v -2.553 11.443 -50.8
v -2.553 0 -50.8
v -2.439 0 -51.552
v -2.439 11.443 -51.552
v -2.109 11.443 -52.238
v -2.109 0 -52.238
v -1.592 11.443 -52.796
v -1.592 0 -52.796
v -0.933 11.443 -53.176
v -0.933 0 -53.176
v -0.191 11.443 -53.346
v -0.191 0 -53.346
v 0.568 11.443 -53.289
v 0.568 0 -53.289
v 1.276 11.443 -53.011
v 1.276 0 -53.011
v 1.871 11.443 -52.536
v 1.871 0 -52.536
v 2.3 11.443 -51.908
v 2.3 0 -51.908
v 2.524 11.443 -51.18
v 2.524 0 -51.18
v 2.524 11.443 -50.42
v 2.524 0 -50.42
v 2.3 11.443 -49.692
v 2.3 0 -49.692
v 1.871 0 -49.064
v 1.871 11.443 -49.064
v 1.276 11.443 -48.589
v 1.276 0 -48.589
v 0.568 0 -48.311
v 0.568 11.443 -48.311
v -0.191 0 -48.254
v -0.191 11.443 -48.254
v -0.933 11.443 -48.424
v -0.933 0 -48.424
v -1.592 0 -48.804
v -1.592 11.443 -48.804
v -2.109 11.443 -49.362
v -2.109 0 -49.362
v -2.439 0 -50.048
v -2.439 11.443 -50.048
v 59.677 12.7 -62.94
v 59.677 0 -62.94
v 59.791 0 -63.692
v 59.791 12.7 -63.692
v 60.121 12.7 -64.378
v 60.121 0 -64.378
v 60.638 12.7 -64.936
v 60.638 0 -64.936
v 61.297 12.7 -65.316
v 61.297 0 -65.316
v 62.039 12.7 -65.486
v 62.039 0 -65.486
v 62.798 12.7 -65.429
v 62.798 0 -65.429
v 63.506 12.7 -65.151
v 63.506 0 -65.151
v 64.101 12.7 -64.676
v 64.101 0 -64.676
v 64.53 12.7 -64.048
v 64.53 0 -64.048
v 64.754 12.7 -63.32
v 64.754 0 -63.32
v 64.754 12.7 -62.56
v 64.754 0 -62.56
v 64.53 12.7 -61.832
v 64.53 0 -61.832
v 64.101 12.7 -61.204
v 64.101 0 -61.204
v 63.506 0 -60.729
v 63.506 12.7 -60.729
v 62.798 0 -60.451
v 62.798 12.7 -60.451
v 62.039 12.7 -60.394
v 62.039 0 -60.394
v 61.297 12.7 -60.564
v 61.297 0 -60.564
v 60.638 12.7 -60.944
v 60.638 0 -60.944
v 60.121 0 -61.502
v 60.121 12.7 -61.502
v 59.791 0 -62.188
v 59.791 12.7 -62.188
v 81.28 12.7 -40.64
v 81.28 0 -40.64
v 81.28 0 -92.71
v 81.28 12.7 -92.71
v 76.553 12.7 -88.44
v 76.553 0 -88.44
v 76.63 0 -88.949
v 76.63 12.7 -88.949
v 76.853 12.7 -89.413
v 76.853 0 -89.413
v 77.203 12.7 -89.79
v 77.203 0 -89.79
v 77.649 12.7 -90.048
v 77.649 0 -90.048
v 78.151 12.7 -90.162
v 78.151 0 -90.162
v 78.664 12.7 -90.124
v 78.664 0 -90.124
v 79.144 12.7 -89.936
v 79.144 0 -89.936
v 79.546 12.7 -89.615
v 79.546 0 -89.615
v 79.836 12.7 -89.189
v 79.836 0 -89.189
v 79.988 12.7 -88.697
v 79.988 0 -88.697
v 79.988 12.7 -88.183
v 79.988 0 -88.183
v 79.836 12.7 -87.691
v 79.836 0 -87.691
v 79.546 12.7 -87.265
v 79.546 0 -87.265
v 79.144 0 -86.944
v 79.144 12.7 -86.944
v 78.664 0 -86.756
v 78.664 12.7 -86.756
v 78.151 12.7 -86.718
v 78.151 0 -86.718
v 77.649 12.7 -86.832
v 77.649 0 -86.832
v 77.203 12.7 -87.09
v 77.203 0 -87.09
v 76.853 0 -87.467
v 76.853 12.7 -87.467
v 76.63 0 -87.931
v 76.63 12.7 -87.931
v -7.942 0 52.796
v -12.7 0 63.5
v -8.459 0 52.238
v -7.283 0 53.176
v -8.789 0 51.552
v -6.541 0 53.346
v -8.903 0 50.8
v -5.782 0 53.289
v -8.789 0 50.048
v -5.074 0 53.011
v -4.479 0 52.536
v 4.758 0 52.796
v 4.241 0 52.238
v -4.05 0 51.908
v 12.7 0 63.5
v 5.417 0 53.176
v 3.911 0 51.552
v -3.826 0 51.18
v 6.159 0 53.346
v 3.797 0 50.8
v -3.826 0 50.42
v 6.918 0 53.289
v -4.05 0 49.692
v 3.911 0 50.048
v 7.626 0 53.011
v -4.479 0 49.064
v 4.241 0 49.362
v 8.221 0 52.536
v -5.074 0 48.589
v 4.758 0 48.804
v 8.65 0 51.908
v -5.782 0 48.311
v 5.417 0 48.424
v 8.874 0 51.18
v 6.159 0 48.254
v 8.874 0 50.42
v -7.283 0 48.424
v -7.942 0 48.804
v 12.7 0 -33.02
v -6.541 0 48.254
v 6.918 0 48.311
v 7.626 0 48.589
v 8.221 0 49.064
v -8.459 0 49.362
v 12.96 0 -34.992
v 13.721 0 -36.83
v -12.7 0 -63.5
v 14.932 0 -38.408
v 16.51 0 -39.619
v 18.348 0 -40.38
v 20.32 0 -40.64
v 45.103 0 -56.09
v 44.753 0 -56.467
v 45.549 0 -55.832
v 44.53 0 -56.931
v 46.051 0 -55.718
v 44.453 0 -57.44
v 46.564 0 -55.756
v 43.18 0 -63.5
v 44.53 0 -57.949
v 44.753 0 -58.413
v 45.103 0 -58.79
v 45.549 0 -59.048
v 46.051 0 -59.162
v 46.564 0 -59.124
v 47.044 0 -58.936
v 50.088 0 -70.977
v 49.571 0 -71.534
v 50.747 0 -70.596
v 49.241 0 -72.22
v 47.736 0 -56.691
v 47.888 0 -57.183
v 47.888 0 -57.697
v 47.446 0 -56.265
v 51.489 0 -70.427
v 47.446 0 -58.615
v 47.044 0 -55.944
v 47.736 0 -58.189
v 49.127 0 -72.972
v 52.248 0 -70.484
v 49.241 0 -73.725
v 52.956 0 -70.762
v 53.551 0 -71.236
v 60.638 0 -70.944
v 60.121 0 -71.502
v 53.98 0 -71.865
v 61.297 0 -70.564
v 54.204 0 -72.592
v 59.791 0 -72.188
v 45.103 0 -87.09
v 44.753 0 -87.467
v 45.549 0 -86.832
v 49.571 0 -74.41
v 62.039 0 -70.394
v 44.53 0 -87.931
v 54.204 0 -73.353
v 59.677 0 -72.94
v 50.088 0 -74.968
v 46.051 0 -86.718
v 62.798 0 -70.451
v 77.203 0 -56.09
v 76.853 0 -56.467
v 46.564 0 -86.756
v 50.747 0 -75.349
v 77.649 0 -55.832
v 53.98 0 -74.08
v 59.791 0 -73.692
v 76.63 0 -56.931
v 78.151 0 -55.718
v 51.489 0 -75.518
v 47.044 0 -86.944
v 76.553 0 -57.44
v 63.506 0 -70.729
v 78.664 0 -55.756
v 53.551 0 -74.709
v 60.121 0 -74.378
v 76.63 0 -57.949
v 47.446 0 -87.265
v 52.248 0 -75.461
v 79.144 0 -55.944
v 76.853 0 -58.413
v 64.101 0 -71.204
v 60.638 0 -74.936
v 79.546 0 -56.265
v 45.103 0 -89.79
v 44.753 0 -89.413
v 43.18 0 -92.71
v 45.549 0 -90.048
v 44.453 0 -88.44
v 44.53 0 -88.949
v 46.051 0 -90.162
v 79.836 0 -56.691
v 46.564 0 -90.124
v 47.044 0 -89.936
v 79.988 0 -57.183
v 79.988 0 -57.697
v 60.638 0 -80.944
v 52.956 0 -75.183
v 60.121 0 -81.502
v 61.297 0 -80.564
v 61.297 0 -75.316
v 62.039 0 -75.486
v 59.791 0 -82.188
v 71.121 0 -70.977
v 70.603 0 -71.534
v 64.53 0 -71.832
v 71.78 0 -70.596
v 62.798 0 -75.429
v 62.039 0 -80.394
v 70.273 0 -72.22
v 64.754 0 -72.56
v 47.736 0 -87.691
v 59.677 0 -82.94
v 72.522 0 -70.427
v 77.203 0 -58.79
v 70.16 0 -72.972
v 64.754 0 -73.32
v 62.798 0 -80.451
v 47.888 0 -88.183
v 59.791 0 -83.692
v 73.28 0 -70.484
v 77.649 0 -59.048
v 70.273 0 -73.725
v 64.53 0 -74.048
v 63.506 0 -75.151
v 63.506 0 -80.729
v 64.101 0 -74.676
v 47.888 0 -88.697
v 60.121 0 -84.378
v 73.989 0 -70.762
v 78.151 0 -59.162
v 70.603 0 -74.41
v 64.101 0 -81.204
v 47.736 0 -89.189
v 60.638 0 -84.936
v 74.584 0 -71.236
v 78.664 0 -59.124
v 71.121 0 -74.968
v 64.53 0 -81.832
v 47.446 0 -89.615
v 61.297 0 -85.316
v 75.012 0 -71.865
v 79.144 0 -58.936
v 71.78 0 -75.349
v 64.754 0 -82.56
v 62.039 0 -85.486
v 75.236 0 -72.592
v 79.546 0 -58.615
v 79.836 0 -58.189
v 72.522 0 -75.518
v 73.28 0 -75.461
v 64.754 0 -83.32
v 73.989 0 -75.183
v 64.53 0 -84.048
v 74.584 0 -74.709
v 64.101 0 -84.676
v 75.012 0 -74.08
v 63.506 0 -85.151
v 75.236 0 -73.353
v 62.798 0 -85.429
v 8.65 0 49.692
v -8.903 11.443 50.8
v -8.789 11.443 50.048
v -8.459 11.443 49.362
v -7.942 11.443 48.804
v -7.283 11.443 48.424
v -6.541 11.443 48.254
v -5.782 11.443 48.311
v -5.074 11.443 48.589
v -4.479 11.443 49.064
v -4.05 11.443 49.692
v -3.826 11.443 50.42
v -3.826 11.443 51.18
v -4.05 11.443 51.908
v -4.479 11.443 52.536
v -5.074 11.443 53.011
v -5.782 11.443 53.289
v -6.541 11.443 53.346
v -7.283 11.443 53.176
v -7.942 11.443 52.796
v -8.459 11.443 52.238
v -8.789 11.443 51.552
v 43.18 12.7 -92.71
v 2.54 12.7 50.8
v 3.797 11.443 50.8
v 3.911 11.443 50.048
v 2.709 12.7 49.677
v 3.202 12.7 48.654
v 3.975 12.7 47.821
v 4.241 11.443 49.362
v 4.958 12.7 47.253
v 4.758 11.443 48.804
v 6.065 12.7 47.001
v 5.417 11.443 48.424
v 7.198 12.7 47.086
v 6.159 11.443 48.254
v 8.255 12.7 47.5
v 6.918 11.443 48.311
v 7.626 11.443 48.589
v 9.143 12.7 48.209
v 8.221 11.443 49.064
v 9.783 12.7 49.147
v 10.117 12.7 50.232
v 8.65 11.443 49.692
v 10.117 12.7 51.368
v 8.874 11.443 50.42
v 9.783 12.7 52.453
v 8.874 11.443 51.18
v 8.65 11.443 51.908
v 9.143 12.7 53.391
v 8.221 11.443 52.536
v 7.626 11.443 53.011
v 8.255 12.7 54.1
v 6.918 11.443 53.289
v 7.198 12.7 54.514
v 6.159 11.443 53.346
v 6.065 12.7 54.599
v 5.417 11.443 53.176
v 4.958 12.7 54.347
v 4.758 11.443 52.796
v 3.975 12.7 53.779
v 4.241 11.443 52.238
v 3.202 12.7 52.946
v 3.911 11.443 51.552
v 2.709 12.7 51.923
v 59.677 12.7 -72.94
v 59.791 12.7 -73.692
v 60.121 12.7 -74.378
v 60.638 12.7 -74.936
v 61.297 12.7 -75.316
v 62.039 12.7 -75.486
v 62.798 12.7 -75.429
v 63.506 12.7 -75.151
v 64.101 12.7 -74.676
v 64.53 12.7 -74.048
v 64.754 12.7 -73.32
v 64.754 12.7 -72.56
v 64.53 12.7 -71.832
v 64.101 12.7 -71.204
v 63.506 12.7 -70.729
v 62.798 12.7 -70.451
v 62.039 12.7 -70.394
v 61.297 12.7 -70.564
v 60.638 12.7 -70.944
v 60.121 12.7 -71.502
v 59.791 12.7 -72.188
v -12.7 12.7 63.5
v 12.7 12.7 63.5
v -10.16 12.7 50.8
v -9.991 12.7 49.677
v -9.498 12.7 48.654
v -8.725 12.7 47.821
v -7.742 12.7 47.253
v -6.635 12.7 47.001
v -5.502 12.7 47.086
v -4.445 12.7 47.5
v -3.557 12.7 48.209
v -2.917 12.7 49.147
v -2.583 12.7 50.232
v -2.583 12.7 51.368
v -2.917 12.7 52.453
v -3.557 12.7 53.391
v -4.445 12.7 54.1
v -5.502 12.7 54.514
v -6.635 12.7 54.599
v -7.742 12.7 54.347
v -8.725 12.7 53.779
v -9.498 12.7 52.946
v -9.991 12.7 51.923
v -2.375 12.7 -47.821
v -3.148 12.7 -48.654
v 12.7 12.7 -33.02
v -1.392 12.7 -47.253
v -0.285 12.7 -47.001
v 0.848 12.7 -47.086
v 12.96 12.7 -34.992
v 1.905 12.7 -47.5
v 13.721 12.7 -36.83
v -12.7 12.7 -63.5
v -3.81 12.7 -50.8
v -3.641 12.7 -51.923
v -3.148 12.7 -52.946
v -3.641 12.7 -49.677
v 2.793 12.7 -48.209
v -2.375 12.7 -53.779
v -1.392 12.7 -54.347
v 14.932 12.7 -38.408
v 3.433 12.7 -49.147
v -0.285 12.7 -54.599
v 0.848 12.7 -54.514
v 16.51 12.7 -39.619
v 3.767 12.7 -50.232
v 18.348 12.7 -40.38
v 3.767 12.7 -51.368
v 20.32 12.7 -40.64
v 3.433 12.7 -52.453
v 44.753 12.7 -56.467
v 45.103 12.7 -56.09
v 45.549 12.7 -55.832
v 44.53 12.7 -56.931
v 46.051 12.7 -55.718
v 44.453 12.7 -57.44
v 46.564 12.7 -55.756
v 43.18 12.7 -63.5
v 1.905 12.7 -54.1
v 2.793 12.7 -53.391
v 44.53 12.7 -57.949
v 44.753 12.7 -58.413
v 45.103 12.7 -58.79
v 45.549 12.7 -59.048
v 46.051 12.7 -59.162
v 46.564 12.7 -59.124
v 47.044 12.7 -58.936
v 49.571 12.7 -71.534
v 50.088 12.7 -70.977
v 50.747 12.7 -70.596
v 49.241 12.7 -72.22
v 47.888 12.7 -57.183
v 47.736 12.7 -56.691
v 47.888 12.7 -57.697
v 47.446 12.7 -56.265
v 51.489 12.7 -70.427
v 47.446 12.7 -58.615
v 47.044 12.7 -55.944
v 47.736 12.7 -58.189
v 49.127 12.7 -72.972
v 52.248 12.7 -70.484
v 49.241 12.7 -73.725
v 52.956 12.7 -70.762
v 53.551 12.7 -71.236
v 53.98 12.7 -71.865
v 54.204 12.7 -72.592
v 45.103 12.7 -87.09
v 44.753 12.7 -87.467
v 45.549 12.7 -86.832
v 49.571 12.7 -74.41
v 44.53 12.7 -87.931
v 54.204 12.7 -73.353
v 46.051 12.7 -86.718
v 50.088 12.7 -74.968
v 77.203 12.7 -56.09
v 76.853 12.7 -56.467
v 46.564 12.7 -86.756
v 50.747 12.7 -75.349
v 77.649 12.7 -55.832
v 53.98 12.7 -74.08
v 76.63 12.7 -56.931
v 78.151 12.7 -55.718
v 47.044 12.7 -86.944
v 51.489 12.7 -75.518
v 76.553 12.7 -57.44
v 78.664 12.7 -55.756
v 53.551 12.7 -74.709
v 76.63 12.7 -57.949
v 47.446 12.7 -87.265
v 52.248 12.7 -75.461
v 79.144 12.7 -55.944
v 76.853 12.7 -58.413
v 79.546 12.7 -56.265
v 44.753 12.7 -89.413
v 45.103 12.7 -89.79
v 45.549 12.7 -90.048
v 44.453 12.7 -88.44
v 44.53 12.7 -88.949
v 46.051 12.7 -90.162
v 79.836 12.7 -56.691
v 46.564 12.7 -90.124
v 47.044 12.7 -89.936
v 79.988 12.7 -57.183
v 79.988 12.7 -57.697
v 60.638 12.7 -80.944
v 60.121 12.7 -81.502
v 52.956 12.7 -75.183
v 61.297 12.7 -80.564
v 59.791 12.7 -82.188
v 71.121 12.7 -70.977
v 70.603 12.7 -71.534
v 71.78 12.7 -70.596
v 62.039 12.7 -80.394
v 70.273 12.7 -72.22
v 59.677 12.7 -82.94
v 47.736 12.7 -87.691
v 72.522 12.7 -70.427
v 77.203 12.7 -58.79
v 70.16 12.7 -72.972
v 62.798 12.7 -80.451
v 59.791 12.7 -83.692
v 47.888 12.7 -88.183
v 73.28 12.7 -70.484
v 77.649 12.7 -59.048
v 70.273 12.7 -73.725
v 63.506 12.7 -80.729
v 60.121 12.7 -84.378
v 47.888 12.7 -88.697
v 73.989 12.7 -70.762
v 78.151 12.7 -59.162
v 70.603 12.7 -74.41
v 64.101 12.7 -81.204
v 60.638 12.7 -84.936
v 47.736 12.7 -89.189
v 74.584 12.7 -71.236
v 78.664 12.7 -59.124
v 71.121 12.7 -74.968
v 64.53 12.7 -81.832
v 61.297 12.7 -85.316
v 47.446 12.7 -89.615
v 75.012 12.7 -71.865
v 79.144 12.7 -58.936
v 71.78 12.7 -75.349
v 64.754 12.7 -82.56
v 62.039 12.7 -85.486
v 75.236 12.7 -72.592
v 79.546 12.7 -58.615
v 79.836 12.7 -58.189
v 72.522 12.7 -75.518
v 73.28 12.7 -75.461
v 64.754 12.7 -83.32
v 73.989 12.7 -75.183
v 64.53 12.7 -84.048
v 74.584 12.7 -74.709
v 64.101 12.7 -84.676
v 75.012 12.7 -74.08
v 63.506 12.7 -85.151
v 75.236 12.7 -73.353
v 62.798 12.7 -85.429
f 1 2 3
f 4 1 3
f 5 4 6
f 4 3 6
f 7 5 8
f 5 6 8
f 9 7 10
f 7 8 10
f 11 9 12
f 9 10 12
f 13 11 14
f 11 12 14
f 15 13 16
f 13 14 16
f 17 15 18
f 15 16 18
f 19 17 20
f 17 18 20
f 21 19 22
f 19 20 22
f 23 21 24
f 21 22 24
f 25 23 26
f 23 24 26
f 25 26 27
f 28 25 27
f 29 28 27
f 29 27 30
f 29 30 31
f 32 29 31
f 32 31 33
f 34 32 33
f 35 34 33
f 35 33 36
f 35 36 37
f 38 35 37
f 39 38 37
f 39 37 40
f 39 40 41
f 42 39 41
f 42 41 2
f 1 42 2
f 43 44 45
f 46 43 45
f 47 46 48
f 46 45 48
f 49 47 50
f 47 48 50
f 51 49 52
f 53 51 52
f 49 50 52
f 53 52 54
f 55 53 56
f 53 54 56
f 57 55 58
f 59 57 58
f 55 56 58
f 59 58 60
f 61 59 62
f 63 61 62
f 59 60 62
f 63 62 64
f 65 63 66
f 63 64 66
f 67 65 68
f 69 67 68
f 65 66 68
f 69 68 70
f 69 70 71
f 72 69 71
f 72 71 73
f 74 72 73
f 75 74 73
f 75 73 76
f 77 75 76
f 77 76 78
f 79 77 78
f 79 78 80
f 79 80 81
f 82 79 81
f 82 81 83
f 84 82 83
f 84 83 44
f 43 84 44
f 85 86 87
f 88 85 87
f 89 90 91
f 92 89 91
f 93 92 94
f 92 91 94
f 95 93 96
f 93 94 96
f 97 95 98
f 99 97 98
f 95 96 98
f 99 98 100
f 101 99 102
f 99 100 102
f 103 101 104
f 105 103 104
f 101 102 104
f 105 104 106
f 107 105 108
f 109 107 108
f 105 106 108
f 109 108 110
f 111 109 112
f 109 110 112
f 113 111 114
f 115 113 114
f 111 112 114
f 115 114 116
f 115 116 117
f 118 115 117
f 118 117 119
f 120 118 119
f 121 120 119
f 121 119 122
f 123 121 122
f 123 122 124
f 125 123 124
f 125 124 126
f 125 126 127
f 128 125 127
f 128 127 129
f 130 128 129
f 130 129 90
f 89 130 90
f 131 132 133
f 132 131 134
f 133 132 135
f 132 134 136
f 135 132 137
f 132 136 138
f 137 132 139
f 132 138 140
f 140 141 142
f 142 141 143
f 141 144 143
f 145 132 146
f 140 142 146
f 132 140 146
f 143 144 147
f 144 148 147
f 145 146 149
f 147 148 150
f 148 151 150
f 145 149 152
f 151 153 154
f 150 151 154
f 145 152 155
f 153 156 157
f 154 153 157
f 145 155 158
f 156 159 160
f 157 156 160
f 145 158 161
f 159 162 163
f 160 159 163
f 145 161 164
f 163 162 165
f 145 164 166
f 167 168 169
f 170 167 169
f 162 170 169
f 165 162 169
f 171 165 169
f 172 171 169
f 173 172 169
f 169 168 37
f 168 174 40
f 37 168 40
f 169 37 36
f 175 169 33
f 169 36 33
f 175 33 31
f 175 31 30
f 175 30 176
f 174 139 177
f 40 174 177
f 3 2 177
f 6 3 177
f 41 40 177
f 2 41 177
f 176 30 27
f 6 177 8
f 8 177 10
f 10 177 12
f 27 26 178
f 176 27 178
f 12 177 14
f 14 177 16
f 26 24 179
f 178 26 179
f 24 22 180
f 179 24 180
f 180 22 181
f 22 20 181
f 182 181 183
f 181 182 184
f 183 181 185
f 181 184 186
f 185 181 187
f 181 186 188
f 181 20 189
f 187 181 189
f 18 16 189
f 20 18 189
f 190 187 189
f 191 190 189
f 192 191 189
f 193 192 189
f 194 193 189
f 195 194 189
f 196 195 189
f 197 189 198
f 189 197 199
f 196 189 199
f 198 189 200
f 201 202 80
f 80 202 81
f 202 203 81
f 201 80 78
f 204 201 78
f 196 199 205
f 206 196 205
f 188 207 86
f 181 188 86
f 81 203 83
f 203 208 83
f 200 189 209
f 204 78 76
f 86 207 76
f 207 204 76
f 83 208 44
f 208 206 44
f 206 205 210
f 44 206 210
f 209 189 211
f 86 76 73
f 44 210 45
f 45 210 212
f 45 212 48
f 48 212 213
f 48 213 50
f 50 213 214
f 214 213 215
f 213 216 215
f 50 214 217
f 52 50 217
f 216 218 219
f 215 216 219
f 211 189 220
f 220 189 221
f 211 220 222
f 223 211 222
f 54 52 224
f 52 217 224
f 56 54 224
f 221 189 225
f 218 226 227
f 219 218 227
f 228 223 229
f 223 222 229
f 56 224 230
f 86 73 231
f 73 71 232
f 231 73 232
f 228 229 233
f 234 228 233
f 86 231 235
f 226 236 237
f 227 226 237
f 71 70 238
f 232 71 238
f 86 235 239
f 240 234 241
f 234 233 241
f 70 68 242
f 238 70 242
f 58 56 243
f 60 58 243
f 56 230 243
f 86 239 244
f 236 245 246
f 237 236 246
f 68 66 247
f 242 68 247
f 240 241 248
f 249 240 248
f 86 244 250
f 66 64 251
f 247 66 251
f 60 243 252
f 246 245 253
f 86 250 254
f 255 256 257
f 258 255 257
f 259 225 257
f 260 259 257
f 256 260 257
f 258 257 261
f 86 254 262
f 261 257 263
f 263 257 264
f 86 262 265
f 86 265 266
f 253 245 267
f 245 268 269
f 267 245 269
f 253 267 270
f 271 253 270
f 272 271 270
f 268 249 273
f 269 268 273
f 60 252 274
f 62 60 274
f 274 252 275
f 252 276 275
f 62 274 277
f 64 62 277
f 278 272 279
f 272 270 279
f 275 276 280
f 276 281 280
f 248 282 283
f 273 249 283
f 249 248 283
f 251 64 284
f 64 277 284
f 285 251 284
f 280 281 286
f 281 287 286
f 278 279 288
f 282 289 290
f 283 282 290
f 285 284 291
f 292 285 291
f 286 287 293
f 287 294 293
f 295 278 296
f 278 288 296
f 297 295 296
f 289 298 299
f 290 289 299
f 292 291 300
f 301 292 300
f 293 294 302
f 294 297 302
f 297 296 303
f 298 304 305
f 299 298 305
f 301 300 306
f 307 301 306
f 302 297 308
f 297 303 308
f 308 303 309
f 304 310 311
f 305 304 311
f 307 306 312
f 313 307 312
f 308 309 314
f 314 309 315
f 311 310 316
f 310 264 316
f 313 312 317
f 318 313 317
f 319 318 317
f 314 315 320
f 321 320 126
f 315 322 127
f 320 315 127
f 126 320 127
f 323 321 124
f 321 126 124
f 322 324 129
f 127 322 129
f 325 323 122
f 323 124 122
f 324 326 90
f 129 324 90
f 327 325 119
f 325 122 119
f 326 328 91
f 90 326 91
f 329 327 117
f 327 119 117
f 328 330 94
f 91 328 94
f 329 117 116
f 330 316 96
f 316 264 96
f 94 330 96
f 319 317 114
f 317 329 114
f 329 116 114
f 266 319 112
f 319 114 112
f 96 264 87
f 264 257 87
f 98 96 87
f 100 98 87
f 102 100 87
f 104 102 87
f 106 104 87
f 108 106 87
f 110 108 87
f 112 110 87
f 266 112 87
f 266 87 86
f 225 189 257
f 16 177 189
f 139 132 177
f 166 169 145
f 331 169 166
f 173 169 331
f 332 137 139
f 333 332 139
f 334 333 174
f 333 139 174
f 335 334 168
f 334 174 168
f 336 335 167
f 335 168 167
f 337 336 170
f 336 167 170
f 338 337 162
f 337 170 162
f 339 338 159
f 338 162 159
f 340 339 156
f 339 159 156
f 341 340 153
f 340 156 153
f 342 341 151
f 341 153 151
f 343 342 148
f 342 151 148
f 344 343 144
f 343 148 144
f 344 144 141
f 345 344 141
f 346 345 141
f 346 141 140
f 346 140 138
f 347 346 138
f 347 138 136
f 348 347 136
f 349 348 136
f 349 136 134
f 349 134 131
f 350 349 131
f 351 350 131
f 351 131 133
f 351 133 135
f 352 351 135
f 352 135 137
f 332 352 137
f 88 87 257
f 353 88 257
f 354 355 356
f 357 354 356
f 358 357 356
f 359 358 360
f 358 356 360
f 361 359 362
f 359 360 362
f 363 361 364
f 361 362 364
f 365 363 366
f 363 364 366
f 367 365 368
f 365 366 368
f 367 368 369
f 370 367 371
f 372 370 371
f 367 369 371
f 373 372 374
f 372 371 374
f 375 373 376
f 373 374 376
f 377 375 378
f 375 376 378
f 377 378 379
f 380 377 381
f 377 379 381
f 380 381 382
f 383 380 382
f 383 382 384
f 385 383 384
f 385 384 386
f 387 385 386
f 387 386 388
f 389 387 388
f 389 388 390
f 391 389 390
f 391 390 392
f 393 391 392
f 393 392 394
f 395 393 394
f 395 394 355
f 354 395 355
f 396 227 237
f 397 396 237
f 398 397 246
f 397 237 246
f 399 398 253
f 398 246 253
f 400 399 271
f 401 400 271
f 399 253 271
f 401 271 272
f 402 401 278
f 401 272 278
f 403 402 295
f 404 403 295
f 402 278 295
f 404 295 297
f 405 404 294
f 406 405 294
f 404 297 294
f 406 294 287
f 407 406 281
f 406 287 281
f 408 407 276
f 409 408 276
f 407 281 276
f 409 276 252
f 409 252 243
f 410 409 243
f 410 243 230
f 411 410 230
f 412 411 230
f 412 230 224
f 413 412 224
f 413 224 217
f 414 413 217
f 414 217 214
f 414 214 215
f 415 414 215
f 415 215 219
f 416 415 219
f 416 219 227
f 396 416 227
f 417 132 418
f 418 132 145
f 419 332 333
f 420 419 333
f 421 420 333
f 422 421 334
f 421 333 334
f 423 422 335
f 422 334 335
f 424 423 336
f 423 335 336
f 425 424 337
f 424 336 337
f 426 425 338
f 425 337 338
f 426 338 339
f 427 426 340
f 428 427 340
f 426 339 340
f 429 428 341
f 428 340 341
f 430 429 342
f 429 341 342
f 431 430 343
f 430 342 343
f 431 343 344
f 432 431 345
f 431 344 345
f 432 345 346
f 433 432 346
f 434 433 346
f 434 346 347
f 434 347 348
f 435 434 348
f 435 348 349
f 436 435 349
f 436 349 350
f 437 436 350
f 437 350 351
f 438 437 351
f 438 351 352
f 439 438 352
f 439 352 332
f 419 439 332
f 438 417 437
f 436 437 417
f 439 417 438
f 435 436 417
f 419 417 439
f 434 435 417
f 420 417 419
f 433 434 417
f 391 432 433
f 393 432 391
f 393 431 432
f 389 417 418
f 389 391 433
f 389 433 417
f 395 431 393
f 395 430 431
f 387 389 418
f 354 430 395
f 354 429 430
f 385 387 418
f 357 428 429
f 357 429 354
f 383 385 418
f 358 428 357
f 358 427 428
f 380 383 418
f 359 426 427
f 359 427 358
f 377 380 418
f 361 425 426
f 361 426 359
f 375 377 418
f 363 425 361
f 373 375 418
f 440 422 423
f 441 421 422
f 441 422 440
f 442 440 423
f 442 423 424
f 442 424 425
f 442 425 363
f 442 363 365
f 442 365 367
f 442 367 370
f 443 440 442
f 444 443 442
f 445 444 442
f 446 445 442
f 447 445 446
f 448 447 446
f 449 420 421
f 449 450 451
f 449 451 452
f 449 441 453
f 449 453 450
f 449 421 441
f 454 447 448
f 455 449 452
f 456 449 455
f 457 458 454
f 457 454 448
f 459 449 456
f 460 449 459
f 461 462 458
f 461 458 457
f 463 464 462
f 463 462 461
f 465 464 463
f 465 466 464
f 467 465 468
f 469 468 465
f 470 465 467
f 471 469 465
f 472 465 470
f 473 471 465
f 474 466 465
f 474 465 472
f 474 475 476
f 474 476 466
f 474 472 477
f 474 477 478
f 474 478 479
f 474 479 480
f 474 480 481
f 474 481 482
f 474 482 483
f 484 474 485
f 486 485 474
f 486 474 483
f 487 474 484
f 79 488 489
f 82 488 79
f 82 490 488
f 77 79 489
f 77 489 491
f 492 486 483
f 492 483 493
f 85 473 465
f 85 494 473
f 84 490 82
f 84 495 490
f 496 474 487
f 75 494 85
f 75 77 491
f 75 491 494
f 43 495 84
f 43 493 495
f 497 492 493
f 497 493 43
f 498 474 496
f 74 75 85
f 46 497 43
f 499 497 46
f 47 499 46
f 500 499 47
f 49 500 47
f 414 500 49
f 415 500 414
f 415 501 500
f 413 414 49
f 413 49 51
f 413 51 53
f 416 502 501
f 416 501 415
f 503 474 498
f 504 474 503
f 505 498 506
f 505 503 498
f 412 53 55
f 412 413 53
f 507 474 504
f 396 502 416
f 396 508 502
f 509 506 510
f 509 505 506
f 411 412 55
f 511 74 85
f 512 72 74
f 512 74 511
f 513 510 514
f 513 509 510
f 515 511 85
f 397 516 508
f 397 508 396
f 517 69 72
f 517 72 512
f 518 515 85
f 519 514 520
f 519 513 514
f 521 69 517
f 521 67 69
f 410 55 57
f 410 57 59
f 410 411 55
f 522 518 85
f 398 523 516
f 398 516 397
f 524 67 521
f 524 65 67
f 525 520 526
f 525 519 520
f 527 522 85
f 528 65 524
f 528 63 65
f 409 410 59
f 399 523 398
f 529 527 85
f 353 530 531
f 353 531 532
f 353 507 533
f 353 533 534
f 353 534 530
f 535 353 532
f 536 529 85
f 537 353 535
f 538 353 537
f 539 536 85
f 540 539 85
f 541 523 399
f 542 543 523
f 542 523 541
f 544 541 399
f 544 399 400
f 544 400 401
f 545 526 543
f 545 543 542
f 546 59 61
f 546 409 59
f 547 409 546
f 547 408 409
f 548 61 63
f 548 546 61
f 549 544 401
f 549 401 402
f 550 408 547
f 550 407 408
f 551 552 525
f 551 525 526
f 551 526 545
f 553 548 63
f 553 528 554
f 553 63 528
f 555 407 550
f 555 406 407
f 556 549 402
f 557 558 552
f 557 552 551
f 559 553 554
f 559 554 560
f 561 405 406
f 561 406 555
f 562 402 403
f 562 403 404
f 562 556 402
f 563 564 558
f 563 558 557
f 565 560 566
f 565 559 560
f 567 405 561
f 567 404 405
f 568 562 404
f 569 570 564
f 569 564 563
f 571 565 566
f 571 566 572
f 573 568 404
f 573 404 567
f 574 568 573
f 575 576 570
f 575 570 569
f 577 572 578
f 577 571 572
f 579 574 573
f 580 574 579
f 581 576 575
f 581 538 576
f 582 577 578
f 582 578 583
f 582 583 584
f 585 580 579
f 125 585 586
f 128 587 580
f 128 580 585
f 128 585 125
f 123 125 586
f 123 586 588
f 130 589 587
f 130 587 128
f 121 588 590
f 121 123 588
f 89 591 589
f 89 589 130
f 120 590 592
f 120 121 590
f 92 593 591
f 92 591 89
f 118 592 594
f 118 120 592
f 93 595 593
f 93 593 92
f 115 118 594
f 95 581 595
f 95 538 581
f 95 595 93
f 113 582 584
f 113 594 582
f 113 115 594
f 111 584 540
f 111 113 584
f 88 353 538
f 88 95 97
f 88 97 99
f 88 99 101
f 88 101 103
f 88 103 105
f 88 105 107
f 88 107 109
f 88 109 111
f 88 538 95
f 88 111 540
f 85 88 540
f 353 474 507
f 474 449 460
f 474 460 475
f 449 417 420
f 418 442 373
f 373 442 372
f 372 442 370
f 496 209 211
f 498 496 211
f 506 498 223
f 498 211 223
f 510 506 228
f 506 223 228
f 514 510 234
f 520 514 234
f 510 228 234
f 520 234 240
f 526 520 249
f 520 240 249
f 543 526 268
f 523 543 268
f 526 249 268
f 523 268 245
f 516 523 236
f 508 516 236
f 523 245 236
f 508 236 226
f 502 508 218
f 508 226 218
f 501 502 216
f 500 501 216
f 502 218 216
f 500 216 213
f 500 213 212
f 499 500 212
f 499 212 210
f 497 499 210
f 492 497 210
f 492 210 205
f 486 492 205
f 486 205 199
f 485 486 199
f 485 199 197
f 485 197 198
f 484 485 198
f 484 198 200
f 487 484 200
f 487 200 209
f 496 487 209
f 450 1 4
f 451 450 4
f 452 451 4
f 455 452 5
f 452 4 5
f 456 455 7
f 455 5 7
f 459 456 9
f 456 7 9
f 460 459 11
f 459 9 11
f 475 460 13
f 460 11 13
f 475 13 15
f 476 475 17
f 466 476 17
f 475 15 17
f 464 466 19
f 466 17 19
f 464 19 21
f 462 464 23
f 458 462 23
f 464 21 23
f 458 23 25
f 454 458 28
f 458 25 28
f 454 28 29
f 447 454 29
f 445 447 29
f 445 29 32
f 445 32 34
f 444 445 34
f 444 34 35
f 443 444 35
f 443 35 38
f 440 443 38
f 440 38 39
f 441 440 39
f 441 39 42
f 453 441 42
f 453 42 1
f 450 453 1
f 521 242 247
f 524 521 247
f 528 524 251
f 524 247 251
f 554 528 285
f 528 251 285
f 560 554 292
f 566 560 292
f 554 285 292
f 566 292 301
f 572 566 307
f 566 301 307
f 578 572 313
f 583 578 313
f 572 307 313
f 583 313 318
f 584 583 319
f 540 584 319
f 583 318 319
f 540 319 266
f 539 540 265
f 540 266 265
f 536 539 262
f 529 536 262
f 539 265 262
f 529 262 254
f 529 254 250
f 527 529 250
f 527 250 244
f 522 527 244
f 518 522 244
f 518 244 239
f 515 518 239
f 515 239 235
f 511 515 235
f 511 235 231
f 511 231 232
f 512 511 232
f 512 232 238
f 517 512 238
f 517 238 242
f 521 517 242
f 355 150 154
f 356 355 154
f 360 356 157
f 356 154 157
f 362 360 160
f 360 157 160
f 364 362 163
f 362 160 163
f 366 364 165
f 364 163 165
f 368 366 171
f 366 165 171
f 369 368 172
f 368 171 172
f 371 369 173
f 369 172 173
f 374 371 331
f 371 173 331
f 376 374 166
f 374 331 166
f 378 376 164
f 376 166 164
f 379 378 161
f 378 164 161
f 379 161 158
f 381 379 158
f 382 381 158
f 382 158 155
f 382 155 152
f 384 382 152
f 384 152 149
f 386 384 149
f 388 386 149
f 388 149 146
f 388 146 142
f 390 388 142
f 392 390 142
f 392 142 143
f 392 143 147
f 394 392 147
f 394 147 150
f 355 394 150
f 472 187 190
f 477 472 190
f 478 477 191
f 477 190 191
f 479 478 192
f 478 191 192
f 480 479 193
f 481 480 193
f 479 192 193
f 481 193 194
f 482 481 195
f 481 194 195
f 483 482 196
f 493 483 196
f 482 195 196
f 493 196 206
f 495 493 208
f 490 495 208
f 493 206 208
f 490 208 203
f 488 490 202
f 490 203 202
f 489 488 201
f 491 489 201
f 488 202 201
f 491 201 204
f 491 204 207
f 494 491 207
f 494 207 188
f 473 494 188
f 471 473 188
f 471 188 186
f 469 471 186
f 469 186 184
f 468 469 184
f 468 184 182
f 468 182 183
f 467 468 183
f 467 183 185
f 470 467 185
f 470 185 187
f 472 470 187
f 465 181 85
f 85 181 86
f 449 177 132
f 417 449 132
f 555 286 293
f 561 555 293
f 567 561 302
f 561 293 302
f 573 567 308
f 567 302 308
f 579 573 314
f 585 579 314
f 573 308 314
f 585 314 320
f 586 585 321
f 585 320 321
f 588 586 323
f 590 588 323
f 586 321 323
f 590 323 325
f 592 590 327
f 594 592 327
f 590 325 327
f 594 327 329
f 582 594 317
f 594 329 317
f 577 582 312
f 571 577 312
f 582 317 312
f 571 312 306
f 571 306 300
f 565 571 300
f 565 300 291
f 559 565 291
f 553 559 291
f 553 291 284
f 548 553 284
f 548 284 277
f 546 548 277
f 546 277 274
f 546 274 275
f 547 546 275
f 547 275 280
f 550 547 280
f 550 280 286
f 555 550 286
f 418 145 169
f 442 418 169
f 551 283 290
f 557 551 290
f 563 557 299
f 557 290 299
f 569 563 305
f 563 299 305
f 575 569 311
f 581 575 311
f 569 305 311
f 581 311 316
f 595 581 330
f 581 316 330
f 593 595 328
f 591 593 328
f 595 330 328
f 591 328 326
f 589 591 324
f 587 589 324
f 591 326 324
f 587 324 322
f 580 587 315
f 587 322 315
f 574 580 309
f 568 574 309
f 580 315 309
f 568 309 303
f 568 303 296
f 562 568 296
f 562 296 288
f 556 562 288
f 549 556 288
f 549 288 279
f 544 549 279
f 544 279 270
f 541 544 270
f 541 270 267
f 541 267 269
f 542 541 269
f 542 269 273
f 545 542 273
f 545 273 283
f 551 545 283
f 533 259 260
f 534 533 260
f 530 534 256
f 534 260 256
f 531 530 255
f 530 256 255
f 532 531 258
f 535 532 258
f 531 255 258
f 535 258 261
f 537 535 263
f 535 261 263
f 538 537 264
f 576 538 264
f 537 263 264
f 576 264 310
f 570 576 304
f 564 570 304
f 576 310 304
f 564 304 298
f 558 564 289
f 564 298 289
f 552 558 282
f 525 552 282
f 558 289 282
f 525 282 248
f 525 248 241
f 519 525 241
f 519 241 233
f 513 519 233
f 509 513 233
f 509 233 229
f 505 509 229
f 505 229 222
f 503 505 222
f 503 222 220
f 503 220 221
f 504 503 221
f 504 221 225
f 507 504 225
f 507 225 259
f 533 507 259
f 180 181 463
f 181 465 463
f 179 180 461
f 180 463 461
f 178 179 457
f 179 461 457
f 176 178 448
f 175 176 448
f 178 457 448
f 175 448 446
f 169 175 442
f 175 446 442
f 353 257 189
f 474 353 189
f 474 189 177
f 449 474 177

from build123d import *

# Parameters (mm, degrees)
BOSS_EXTRUDE1_DEPTH               = 12.7
F_1_4_20_TAPPED_HOLE1_D           = 5.1054
F_1_4_20_TAPPED_HOLE1_DEPTH       = 12.7
F_1_4_20_TAPPED_HOLE1_CSINK_D     = 7.62
F_1_4_20_TAPPED_HOLE1_CSINK_ANGLE = 90
F_1_4_20_TAPPED_HOLE2_D           = 5.1054
F_1_4_20_TAPPED_HOLE2_DEPTH       = 12.7
F_1_4_20_TAPPED_HOLE2_CSINK_D     = 7.62
F_1_4_20_TAPPED_HOLE2_CSINK_ANGLE = 90
F_29_0_136_DIAMETER_HOLE1_D       = 3.4544
F_29_0_136_DIAMETER_HOLE1_DEPTH   = 12.7
F_1_4_20_TAPPED_HOLE4_D           = 5.1054
F_1_4_20_TAPPED_HOLE4_DEPTH       = 12.7
LPATTERN1_COUNT                   = 3
LPATTERN1_PITCH                   = 10
F_1_4_20_TAPPED_HOLE6_D           = 5.1054
F_1_4_20_TAPPED_HOLE6_DEPTH       = 12.7
FILLET1_R                         = 7.62


with BuildPart() as part:
    # Sketch1 → Boss-Extrude1 (new body)
    with BuildSketch(Plane(origin=(0, 0, 0), x_dir=(1, 0, 0), z_dir=(0, 1, 0))):
        Polygon((81.28, 40.64), (81.28, 92.71), (43.18, 92.71), (43.18, 63.5), (12.7, 63.5), (-12.7, 63.5), (-12.7, -63.5), (12.7, -63.5), (12.7, 40.64), align=None)
    extrude(amount=BOSS_EXTRUDE1_DEPTH)

    # 1/4-20 Tapped Hole1
    with Locations(Plane(origin=(0, 12.7, 0), x_dir=(1, 0, 0), z_dir=(0, 1, 0))):
        with Locations((-6.35, -50.8), (6.35, -50.8)):
            CounterSinkHole(F_1_4_20_TAPPED_HOLE1_D / 2, F_1_4_20_TAPPED_HOLE1_CSINK_D / 2, depth=F_1_4_20_TAPPED_HOLE1_DEPTH, counter_sink_angle=F_1_4_20_TAPPED_HOLE1_CSINK_ANGLE)

    # 1/4-20 Tapped Hole2
    with Locations(Plane(origin=(0, 12.7, 0), x_dir=(1, 0, 0), z_dir=(0, 1, 0))):
        with Locations((0, 50.8)):
            CounterSinkHole(F_1_4_20_TAPPED_HOLE2_D / 2, F_1_4_20_TAPPED_HOLE2_CSINK_D / 2, depth=F_1_4_20_TAPPED_HOLE2_DEPTH, counter_sink_angle=F_1_4_20_TAPPED_HOLE2_CSINK_ANGLE)

    # #29 (0.136) Diameter Hole1
    with Locations(Plane(origin=(0, 12.7, 0), x_dir=(1, 0, 0), z_dir=(0, 1, 0))):
        with Locations((46.18, 88.44), (78.28, 88.44), (46.18, 57.44), (78.28, 57.44)):
            Hole(F_29_0_136_DIAMETER_HOLE1_D / 2, depth=F_29_0_136_DIAMETER_HOLE1_DEPTH)

    # 1/4-20 Tapped Hole4
    with Locations(Plane(origin=(0, 12.7, 0), x_dir=(1, 0, 0), z_dir=(0, 1, 0))):
        with Locations((62.23, 82.94)):
            f_1_4_20_tapped_hole4 = Hole(F_1_4_20_TAPPED_HOLE4_D / 2, depth=F_1_4_20_TAPPED_HOLE4_DEPTH)

    # LPattern1: 1/4-20 Tapped Hole4 ×3
    with Locations(*[(0, 0, i * LPATTERN1_PITCH) for i in range(1, LPATTERN1_COUNT)]):
        add(f_1_4_20_tapped_hole4, mode=Mode.SUBTRACT)

    # 1/4-20 Tapped Hole6
    with Locations(Plane(origin=(0, 12.7, 0), x_dir=(1, 0, 0), z_dir=(0, 1, 0))):
        with Locations((51.68, 72.972413119), (72.71230772, 72.972413119)):
            Hole(F_1_4_20_TAPPED_HOLE6_D / 2, depth=F_1_4_20_TAPPED_HOLE6_DEPTH)

    # Fillet1
    fillet1_edges = [part.edges().sort_by_distance(p)[0] for p in [
        (12.7, 6.35, -40.64),
    ]]
    fillet(fillet1_edges, radius=FILLET1_R)


solid = part.part
